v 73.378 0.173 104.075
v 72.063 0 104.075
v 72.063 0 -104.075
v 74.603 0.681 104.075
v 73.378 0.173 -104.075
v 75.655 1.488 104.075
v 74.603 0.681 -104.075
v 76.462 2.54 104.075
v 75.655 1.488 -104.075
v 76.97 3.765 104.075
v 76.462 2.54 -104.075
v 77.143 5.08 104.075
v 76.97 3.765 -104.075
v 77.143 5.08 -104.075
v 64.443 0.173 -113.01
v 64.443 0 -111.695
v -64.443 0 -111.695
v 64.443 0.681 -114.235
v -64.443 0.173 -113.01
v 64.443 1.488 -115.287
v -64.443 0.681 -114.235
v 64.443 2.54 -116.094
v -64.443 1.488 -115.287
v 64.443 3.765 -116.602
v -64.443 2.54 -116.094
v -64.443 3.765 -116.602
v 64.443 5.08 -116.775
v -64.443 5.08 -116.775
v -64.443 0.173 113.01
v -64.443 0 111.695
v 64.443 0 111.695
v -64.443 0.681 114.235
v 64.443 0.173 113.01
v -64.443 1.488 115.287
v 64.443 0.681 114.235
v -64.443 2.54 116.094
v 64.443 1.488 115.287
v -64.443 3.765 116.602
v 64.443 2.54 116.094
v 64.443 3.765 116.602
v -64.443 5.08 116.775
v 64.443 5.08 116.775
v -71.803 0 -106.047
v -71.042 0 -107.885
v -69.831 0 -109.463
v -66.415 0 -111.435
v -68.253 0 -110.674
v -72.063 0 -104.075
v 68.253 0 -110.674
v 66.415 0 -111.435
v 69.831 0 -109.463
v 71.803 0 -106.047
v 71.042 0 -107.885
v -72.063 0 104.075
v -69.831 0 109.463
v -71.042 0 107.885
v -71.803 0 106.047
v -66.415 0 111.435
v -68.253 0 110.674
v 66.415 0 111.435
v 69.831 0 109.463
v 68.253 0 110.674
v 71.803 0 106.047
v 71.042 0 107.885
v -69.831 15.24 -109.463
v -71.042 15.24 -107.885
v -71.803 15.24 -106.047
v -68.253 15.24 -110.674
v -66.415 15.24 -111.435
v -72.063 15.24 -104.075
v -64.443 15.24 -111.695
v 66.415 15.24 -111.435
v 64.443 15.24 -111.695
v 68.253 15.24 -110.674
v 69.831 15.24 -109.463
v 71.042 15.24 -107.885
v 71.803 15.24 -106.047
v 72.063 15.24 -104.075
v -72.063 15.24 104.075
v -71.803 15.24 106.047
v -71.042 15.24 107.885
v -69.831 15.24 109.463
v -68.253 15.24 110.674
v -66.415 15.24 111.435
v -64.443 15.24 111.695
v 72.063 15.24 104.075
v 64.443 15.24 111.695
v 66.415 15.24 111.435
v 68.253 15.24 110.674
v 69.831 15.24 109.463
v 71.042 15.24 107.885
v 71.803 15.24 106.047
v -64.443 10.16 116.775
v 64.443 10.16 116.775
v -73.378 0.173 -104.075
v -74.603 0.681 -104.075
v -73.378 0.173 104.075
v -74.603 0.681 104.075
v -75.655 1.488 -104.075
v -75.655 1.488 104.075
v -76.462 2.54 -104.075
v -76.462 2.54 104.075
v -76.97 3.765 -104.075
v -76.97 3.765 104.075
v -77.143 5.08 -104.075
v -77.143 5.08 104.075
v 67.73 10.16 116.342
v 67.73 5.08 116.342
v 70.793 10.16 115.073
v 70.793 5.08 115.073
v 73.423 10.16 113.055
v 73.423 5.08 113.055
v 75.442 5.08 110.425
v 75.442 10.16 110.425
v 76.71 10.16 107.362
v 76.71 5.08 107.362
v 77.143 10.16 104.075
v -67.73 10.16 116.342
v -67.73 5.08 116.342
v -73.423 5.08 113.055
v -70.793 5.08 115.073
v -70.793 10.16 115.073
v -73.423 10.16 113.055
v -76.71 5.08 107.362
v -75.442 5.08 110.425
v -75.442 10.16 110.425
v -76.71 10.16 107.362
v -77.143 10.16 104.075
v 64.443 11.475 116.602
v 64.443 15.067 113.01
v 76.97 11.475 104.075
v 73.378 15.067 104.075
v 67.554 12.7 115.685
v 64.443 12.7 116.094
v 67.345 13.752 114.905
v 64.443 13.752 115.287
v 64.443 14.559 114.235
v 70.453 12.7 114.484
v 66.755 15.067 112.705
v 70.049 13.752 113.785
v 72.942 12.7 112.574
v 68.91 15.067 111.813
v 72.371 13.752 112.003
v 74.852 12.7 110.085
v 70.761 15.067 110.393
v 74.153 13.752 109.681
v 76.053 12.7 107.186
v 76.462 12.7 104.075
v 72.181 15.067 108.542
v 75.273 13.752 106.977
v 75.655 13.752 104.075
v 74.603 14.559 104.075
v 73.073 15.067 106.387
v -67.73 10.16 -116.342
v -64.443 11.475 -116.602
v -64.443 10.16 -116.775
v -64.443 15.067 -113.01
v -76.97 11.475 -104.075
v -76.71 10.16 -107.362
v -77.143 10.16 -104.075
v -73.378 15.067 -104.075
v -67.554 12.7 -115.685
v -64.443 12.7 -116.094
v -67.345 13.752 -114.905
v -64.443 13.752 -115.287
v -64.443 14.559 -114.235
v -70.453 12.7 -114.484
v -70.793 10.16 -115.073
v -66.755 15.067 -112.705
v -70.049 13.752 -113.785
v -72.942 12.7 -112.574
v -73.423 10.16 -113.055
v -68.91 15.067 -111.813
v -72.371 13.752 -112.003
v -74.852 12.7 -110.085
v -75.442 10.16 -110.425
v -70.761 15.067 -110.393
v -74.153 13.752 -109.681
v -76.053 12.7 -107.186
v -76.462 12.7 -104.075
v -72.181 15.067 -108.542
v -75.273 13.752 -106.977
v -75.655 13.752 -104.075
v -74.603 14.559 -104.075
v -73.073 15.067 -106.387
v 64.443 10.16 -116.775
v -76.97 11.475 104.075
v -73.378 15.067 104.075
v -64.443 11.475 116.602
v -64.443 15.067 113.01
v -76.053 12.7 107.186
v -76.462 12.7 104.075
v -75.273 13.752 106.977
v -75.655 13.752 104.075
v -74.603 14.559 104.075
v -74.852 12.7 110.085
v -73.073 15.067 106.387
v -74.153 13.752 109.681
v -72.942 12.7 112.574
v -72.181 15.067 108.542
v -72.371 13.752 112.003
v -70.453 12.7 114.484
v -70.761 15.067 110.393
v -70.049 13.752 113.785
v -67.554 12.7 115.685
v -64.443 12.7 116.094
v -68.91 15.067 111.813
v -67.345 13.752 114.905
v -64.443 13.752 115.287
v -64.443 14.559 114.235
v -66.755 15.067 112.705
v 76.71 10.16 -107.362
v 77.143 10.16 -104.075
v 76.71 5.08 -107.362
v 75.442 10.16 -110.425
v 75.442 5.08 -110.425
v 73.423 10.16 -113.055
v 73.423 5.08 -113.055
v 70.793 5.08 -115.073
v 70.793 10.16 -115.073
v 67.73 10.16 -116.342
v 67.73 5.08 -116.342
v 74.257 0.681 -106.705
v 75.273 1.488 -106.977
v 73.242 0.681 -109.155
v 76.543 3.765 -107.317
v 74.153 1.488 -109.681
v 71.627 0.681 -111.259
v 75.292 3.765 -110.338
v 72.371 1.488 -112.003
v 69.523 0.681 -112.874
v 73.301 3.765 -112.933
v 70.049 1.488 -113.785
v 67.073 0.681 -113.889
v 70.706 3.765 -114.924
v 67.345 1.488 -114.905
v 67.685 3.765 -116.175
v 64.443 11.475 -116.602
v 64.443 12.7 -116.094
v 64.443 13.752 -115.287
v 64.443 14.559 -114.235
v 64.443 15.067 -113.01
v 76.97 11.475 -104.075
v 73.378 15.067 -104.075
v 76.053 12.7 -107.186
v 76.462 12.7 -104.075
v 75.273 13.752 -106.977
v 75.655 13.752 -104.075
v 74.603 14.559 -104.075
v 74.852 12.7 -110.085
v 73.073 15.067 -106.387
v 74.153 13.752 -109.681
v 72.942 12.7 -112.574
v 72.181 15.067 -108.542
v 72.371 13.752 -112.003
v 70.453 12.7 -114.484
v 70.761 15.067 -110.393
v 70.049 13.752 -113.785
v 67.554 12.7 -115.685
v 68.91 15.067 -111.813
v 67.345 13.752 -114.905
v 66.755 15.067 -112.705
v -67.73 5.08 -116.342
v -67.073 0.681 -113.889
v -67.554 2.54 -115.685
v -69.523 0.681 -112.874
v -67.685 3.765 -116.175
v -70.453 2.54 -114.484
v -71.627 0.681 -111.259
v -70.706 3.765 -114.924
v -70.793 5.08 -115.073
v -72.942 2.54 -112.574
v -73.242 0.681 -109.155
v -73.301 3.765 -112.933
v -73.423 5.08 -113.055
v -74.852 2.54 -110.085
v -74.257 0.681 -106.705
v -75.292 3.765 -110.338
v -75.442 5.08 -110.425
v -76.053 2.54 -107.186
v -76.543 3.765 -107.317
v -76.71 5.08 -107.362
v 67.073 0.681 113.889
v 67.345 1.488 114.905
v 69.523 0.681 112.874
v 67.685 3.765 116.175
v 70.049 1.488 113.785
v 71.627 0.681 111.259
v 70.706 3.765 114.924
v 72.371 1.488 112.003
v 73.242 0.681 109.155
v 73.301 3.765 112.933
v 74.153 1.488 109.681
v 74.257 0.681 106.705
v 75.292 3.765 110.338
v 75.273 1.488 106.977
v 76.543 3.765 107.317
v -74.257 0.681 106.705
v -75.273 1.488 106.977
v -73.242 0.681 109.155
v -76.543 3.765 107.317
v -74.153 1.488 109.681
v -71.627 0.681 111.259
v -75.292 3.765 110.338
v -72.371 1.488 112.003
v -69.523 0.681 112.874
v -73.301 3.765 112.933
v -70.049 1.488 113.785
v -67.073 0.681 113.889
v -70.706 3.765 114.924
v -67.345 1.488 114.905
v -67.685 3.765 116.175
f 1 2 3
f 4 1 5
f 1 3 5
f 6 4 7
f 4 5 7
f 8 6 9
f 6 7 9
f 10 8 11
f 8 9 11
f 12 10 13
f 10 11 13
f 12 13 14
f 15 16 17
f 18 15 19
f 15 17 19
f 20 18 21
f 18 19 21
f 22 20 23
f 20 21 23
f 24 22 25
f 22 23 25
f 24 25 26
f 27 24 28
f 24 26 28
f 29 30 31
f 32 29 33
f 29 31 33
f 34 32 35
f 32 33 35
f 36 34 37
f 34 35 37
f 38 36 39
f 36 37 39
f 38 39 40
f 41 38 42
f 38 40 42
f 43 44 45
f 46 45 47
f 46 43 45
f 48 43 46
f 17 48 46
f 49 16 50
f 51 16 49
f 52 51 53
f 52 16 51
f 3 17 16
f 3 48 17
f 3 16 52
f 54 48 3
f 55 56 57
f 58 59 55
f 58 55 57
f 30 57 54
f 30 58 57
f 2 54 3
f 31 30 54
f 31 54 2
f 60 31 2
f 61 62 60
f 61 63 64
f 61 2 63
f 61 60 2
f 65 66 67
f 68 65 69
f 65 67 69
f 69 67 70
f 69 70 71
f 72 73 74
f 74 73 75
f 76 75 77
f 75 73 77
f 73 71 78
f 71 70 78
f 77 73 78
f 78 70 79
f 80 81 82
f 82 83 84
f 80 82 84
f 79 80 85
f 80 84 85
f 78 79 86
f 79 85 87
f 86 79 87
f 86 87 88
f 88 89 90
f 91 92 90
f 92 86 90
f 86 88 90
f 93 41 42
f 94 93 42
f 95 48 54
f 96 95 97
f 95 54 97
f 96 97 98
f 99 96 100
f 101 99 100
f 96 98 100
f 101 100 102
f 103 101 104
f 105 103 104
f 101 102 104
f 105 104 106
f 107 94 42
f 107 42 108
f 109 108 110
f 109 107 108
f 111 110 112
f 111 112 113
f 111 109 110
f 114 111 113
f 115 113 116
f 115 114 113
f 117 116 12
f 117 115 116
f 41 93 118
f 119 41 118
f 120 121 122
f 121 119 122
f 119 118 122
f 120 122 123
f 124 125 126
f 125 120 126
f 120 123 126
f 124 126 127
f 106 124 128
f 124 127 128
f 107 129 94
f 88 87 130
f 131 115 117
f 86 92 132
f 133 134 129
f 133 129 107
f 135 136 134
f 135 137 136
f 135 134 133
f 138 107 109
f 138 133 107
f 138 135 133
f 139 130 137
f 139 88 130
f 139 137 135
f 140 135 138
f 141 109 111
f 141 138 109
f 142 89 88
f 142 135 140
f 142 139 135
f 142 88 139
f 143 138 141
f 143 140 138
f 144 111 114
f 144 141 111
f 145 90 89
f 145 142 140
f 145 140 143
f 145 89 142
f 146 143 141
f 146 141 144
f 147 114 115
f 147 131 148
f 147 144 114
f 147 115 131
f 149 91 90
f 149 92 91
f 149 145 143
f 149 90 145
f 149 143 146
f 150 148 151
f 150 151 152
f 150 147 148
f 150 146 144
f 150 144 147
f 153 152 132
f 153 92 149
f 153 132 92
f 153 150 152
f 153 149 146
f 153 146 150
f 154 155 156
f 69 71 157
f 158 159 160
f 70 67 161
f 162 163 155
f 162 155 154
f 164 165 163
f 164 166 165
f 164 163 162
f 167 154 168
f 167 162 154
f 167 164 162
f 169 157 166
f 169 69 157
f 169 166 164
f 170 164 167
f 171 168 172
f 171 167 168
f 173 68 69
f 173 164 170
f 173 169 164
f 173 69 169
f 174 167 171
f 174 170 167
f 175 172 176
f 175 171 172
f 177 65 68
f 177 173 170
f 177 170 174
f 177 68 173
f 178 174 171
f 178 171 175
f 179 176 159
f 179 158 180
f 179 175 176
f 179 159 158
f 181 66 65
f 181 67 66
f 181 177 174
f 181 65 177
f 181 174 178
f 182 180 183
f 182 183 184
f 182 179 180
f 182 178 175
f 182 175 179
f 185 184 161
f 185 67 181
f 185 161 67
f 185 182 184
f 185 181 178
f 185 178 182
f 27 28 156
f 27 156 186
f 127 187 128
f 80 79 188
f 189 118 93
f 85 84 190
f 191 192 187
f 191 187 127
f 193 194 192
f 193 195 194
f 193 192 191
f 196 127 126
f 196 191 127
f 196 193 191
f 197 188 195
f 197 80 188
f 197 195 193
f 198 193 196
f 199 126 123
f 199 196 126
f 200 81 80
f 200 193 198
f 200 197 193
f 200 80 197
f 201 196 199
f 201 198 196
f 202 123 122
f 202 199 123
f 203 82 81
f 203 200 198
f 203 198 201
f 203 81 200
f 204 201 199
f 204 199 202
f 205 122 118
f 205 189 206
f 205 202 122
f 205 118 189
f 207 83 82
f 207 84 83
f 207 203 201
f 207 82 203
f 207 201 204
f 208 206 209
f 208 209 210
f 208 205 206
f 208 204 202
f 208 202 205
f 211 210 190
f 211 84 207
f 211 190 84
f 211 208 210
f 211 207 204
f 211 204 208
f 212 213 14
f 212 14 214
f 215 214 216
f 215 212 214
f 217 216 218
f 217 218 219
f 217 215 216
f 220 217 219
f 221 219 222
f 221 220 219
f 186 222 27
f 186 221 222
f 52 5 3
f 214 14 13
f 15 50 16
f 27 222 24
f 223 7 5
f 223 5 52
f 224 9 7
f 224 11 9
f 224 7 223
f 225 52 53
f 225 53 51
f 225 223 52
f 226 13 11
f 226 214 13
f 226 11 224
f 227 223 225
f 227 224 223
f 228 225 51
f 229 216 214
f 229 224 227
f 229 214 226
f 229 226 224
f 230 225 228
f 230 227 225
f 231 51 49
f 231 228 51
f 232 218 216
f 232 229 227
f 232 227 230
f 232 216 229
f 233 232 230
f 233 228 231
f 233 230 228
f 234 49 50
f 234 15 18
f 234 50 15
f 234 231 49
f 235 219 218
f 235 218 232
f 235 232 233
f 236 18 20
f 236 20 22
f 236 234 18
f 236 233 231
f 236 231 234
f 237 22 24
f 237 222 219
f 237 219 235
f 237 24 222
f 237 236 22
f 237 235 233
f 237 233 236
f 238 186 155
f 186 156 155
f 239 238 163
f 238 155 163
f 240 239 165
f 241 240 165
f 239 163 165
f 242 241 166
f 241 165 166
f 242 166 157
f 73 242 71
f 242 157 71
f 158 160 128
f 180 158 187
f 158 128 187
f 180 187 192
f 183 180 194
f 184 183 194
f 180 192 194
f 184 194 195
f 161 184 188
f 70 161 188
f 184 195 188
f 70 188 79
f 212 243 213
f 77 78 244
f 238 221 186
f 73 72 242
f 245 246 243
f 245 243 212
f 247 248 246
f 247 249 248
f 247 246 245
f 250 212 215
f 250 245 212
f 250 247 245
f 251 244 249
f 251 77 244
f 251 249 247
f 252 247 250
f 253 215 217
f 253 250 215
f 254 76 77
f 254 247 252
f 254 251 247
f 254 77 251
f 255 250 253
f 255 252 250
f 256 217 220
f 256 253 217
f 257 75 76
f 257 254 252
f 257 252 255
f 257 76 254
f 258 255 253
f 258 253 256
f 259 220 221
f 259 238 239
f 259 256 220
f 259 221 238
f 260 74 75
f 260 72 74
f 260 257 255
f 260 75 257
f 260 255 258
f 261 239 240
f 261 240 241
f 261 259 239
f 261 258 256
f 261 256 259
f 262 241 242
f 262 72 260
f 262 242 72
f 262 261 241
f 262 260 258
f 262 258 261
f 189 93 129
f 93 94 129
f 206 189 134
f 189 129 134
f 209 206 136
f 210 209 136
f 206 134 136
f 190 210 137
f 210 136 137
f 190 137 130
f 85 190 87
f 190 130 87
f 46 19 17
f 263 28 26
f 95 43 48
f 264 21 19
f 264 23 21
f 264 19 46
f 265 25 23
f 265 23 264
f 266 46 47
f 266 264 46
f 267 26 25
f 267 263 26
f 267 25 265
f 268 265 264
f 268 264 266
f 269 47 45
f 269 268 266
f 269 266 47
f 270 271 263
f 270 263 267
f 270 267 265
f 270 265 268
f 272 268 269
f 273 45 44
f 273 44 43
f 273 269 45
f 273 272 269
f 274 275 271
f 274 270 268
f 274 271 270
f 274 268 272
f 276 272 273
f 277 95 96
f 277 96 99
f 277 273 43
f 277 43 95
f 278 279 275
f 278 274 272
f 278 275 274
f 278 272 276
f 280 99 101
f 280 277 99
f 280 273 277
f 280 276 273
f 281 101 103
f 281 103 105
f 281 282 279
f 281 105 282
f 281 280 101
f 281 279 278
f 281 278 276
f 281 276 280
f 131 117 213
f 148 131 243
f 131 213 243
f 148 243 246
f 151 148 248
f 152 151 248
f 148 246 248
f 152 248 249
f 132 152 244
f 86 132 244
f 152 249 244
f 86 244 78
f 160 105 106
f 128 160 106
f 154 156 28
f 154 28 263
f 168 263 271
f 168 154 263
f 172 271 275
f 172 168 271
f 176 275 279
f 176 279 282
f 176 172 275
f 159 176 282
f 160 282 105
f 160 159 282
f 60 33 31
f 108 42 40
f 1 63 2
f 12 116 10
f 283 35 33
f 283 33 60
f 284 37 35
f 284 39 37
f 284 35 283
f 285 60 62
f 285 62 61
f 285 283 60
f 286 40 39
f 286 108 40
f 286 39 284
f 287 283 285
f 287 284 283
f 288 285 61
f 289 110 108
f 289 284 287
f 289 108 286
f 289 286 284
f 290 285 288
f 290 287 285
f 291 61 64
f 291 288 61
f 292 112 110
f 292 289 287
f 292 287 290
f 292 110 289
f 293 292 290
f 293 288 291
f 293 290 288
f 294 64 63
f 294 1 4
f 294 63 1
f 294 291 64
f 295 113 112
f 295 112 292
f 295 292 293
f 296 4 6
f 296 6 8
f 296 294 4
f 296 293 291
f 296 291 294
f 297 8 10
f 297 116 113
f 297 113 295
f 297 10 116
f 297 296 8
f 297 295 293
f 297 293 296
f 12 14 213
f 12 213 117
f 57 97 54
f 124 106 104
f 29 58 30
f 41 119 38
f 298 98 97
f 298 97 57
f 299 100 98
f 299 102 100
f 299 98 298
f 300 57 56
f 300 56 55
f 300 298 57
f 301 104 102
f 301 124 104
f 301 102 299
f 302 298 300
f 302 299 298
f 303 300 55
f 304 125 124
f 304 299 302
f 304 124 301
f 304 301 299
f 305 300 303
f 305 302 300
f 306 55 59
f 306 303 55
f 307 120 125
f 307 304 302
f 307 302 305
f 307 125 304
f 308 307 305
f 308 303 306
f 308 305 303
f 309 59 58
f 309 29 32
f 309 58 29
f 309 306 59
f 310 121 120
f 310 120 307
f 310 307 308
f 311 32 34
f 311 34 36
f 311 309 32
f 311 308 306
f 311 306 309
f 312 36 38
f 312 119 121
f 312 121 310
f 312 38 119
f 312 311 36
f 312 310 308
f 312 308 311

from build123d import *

# Parameters (mm, degrees)
F0_W     = 154.28596735
F0_H     = 233.5498631001
F2_DEPTH = 15.24
F3_DEPTH = 15.24
F4_R     = 12.7
F6_R     = 12.7
F7_R     = 12.7
F8_R     = 12.7
F9_R     = 5.08


# Not quite as in the source:
# - the program builds the solid bodies; features that only make, move or delete a surface that nothing else refers to are left out


with BuildPart() as f2:
    # F0 (on Front) → F2 (new body)
    with BuildSketch(Plane.XZ):
        Rectangle(F0_W, F0_H)
    extrude(amount=-F2_DEPTH)

    # F3 (add): a face of the model
    f3_faces = [f2.faces().sort_by_distance(p)[0] for p in [
        (0, 15.24, 0),
    ]]
    extrude(f3_faces, amount=-F3_DEPTH)

    # F4
    f4_edges = [f2.edges().sort_by_distance(p)[0] for p in [
        (77.142984, 7.62, 116.774932),
    ]]
    fillet(f4_edges, radius=F4_R)

    # F6
    f6_edges = [f2.edges().sort_by_distance(p)[0] for p in [
        (-77.142984, 7.62, 116.774932),
    ]]
    fillet(f6_edges, radius=F6_R)

    # F7
    f7_edges = [f2.edges().sort_by_distance(p)[0] for p in [
        (77.142984, 7.62, -116.774932),
    ]]
    fillet(f7_edges, radius=F7_R)

    # F8
    f8_edges = [f2.edges().sort_by_distance(p)[0] for p in [
        (-77.142984, 7.62, -116.774932),
    ]]
    fillet(f8_edges, radius=F8_R)

    # F9
    f9_edges = [f2.edges().sort_by_distance(p)[0] for p in [
        (-77.142984, 15.24, 0),
        (-77.142984, 0, 0),
        (77.142984, 0, 0),
        (77.142984, 15.24, 0),
        (0, 0, 116.774932),
        (0, 15.24, 116.774932),
        (0, 15.24, -116.774932),
        (0, 0, -116.774932),
    ]]
    fillet(f9_edges, radius=F9_R)


solid = f2.part
